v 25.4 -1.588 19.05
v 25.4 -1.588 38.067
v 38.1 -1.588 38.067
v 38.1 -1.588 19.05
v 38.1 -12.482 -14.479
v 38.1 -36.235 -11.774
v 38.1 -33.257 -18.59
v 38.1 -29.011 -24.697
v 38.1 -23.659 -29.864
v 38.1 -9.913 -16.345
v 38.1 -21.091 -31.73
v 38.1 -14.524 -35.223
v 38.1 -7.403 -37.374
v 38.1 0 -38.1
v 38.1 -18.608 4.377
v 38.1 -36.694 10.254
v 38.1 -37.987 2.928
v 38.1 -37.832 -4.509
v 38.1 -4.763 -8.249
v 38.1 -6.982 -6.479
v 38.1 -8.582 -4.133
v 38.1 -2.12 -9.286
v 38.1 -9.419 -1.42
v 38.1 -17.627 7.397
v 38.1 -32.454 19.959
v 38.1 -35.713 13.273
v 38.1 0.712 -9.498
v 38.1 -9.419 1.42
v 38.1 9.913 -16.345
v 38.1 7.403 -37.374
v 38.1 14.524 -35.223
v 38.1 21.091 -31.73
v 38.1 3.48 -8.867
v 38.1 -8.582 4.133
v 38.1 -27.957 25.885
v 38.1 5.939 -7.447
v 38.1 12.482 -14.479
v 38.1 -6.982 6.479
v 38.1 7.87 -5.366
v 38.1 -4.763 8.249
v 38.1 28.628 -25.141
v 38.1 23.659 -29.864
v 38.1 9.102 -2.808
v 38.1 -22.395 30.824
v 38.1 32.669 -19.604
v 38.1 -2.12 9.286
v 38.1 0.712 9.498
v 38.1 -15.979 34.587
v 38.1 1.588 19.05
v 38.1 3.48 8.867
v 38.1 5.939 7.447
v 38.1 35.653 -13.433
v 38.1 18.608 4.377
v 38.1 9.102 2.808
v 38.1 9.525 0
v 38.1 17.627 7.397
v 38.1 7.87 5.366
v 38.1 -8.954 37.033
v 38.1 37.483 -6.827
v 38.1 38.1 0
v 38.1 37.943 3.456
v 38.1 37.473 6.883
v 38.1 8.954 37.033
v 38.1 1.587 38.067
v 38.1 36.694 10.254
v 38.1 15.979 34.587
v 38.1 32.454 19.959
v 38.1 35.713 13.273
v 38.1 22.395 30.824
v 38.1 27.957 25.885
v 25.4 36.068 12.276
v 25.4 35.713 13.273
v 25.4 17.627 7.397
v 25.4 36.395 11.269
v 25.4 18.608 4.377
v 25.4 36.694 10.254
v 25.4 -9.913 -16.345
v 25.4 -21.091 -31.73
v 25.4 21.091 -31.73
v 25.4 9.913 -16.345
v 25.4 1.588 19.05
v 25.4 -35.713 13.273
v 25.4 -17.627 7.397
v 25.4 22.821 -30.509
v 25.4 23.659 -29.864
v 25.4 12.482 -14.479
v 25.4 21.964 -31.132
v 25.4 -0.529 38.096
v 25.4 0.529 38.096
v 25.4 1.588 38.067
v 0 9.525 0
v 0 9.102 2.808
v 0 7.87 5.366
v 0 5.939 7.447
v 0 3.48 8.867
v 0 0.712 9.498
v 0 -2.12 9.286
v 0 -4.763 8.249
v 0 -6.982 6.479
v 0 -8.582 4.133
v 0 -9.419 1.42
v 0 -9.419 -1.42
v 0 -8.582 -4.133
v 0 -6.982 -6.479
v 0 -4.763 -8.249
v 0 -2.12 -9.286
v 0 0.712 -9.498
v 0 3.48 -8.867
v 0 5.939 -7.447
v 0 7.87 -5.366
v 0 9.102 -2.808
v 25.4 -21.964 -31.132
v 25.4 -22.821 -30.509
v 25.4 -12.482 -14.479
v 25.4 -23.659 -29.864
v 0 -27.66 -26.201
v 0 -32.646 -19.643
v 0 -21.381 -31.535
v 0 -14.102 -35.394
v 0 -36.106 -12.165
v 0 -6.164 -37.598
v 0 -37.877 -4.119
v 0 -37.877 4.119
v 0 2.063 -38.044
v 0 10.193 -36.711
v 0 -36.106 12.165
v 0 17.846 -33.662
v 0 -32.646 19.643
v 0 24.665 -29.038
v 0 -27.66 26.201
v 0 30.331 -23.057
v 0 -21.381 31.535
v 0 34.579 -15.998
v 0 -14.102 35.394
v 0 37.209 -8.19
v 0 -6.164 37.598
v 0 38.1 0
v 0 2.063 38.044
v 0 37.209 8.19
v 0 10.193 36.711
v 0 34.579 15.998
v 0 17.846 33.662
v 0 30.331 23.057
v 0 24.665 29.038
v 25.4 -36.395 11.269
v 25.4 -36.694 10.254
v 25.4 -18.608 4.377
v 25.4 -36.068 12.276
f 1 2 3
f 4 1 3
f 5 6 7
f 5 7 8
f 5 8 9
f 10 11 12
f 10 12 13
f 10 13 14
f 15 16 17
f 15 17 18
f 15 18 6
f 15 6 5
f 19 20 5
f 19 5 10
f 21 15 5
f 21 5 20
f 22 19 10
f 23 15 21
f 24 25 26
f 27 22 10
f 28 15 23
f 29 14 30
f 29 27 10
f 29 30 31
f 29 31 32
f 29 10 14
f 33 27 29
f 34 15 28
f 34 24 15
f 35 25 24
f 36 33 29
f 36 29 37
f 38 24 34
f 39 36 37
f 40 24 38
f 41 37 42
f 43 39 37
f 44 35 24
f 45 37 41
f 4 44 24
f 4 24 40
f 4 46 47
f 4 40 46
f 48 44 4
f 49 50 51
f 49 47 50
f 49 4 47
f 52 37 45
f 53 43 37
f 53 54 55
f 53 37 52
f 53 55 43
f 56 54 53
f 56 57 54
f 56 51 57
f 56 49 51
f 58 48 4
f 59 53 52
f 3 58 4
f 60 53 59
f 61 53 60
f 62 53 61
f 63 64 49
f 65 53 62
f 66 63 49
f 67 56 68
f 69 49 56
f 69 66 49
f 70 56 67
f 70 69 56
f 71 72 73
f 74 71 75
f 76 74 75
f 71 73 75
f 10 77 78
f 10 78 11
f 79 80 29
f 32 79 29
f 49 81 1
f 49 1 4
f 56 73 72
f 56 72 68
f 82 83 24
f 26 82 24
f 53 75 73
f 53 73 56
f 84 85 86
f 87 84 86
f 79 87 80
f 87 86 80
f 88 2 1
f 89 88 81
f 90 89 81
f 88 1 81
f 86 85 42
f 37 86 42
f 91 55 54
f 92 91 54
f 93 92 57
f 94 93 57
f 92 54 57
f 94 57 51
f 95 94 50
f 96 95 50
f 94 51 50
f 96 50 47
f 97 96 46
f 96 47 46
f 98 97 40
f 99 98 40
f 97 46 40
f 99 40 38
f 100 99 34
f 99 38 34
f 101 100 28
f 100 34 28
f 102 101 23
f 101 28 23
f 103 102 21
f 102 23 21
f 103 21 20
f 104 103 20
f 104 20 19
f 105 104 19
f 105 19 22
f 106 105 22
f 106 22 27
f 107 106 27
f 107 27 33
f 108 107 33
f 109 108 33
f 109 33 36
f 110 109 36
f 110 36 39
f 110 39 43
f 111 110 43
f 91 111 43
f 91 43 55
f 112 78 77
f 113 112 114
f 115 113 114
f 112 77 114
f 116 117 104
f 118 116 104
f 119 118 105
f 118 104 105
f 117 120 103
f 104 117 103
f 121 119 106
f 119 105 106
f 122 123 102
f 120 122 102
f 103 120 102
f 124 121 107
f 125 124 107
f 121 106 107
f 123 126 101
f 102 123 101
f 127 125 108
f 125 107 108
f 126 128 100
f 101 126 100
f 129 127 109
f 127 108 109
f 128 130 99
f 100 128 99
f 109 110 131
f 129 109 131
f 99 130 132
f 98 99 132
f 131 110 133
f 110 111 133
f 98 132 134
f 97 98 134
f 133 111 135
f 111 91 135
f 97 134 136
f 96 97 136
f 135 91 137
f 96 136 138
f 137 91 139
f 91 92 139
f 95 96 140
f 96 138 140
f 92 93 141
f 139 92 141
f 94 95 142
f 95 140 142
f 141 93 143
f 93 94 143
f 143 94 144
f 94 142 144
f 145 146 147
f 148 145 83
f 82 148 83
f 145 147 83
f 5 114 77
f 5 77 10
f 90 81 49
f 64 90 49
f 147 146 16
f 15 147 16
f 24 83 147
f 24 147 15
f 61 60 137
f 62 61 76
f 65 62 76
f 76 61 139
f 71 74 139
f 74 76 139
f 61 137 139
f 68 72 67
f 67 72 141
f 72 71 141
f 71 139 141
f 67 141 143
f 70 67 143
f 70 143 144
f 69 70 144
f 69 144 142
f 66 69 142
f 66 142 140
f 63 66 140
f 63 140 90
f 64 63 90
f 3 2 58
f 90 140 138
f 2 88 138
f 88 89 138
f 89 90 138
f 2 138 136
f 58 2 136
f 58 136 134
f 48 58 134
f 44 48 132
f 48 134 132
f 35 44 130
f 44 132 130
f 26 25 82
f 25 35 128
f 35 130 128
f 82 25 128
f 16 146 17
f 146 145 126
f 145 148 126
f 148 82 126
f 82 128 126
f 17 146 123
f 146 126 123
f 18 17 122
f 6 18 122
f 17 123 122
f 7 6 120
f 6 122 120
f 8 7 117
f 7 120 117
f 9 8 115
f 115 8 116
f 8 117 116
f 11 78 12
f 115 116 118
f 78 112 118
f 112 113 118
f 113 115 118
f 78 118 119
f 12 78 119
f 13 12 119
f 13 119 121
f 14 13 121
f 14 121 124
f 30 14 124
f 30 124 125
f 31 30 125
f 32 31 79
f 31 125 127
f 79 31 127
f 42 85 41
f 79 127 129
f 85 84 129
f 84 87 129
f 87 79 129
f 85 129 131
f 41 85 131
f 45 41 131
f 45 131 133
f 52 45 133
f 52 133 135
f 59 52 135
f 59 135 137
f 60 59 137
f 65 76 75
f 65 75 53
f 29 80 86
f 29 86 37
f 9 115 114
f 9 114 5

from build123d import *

# Parameters (mm, degrees)
F0_R            = 38.1
F1_DEPTH        = 38.1
F3_START        = 19.05
F2_W            = 12.7
F2_H            = 3.175
F3_DEPTH        = 19.05
F3_COPIES_COUNT = 5
F4_R            = 9.525
F5_DEPTH        = 38.101


# Not quite as in the source:
# - a pattern or mirror of a feature is missing from the dataset's text; its kind, count and spacing are read off the source's solid


with BuildPart() as f1:
    # F0 (on Right) → F1 (new body)
    with BuildSketch(Plane.YZ):
        Circle(F0_R)
    extrude(amount=F1_DEPTH)

    # F2 (on Top) → F3 (cut)
    with BuildSketch(Plane.XY.offset(F3_START)):
        with Locations((31.75, 0)):
            Rectangle(F2_W, F2_H)
    f3 = extrude(amount=F3_DEPTH, mode=Mode.SUBTRACT)

    # F3_copies: F3 ×5 about axis
    f3_copies_axis = Axis((0, 0, 0), (1, 0, 0))
    for i in range(1, F3_COPIES_COUNT):
        add(f3.rotate(f3_copies_axis, i * 360 / F3_COPIES_COUNT), mode=Mode.SUBTRACT)

    # F4 (on face) → F5 (cut, through all)
    with BuildSketch(Plane.YZ.offset(38.1)):
        Circle(F4_R)
    extrude(amount=-F5_DEPTH, mode=Mode.SUBTRACT)


solid = f1.part
